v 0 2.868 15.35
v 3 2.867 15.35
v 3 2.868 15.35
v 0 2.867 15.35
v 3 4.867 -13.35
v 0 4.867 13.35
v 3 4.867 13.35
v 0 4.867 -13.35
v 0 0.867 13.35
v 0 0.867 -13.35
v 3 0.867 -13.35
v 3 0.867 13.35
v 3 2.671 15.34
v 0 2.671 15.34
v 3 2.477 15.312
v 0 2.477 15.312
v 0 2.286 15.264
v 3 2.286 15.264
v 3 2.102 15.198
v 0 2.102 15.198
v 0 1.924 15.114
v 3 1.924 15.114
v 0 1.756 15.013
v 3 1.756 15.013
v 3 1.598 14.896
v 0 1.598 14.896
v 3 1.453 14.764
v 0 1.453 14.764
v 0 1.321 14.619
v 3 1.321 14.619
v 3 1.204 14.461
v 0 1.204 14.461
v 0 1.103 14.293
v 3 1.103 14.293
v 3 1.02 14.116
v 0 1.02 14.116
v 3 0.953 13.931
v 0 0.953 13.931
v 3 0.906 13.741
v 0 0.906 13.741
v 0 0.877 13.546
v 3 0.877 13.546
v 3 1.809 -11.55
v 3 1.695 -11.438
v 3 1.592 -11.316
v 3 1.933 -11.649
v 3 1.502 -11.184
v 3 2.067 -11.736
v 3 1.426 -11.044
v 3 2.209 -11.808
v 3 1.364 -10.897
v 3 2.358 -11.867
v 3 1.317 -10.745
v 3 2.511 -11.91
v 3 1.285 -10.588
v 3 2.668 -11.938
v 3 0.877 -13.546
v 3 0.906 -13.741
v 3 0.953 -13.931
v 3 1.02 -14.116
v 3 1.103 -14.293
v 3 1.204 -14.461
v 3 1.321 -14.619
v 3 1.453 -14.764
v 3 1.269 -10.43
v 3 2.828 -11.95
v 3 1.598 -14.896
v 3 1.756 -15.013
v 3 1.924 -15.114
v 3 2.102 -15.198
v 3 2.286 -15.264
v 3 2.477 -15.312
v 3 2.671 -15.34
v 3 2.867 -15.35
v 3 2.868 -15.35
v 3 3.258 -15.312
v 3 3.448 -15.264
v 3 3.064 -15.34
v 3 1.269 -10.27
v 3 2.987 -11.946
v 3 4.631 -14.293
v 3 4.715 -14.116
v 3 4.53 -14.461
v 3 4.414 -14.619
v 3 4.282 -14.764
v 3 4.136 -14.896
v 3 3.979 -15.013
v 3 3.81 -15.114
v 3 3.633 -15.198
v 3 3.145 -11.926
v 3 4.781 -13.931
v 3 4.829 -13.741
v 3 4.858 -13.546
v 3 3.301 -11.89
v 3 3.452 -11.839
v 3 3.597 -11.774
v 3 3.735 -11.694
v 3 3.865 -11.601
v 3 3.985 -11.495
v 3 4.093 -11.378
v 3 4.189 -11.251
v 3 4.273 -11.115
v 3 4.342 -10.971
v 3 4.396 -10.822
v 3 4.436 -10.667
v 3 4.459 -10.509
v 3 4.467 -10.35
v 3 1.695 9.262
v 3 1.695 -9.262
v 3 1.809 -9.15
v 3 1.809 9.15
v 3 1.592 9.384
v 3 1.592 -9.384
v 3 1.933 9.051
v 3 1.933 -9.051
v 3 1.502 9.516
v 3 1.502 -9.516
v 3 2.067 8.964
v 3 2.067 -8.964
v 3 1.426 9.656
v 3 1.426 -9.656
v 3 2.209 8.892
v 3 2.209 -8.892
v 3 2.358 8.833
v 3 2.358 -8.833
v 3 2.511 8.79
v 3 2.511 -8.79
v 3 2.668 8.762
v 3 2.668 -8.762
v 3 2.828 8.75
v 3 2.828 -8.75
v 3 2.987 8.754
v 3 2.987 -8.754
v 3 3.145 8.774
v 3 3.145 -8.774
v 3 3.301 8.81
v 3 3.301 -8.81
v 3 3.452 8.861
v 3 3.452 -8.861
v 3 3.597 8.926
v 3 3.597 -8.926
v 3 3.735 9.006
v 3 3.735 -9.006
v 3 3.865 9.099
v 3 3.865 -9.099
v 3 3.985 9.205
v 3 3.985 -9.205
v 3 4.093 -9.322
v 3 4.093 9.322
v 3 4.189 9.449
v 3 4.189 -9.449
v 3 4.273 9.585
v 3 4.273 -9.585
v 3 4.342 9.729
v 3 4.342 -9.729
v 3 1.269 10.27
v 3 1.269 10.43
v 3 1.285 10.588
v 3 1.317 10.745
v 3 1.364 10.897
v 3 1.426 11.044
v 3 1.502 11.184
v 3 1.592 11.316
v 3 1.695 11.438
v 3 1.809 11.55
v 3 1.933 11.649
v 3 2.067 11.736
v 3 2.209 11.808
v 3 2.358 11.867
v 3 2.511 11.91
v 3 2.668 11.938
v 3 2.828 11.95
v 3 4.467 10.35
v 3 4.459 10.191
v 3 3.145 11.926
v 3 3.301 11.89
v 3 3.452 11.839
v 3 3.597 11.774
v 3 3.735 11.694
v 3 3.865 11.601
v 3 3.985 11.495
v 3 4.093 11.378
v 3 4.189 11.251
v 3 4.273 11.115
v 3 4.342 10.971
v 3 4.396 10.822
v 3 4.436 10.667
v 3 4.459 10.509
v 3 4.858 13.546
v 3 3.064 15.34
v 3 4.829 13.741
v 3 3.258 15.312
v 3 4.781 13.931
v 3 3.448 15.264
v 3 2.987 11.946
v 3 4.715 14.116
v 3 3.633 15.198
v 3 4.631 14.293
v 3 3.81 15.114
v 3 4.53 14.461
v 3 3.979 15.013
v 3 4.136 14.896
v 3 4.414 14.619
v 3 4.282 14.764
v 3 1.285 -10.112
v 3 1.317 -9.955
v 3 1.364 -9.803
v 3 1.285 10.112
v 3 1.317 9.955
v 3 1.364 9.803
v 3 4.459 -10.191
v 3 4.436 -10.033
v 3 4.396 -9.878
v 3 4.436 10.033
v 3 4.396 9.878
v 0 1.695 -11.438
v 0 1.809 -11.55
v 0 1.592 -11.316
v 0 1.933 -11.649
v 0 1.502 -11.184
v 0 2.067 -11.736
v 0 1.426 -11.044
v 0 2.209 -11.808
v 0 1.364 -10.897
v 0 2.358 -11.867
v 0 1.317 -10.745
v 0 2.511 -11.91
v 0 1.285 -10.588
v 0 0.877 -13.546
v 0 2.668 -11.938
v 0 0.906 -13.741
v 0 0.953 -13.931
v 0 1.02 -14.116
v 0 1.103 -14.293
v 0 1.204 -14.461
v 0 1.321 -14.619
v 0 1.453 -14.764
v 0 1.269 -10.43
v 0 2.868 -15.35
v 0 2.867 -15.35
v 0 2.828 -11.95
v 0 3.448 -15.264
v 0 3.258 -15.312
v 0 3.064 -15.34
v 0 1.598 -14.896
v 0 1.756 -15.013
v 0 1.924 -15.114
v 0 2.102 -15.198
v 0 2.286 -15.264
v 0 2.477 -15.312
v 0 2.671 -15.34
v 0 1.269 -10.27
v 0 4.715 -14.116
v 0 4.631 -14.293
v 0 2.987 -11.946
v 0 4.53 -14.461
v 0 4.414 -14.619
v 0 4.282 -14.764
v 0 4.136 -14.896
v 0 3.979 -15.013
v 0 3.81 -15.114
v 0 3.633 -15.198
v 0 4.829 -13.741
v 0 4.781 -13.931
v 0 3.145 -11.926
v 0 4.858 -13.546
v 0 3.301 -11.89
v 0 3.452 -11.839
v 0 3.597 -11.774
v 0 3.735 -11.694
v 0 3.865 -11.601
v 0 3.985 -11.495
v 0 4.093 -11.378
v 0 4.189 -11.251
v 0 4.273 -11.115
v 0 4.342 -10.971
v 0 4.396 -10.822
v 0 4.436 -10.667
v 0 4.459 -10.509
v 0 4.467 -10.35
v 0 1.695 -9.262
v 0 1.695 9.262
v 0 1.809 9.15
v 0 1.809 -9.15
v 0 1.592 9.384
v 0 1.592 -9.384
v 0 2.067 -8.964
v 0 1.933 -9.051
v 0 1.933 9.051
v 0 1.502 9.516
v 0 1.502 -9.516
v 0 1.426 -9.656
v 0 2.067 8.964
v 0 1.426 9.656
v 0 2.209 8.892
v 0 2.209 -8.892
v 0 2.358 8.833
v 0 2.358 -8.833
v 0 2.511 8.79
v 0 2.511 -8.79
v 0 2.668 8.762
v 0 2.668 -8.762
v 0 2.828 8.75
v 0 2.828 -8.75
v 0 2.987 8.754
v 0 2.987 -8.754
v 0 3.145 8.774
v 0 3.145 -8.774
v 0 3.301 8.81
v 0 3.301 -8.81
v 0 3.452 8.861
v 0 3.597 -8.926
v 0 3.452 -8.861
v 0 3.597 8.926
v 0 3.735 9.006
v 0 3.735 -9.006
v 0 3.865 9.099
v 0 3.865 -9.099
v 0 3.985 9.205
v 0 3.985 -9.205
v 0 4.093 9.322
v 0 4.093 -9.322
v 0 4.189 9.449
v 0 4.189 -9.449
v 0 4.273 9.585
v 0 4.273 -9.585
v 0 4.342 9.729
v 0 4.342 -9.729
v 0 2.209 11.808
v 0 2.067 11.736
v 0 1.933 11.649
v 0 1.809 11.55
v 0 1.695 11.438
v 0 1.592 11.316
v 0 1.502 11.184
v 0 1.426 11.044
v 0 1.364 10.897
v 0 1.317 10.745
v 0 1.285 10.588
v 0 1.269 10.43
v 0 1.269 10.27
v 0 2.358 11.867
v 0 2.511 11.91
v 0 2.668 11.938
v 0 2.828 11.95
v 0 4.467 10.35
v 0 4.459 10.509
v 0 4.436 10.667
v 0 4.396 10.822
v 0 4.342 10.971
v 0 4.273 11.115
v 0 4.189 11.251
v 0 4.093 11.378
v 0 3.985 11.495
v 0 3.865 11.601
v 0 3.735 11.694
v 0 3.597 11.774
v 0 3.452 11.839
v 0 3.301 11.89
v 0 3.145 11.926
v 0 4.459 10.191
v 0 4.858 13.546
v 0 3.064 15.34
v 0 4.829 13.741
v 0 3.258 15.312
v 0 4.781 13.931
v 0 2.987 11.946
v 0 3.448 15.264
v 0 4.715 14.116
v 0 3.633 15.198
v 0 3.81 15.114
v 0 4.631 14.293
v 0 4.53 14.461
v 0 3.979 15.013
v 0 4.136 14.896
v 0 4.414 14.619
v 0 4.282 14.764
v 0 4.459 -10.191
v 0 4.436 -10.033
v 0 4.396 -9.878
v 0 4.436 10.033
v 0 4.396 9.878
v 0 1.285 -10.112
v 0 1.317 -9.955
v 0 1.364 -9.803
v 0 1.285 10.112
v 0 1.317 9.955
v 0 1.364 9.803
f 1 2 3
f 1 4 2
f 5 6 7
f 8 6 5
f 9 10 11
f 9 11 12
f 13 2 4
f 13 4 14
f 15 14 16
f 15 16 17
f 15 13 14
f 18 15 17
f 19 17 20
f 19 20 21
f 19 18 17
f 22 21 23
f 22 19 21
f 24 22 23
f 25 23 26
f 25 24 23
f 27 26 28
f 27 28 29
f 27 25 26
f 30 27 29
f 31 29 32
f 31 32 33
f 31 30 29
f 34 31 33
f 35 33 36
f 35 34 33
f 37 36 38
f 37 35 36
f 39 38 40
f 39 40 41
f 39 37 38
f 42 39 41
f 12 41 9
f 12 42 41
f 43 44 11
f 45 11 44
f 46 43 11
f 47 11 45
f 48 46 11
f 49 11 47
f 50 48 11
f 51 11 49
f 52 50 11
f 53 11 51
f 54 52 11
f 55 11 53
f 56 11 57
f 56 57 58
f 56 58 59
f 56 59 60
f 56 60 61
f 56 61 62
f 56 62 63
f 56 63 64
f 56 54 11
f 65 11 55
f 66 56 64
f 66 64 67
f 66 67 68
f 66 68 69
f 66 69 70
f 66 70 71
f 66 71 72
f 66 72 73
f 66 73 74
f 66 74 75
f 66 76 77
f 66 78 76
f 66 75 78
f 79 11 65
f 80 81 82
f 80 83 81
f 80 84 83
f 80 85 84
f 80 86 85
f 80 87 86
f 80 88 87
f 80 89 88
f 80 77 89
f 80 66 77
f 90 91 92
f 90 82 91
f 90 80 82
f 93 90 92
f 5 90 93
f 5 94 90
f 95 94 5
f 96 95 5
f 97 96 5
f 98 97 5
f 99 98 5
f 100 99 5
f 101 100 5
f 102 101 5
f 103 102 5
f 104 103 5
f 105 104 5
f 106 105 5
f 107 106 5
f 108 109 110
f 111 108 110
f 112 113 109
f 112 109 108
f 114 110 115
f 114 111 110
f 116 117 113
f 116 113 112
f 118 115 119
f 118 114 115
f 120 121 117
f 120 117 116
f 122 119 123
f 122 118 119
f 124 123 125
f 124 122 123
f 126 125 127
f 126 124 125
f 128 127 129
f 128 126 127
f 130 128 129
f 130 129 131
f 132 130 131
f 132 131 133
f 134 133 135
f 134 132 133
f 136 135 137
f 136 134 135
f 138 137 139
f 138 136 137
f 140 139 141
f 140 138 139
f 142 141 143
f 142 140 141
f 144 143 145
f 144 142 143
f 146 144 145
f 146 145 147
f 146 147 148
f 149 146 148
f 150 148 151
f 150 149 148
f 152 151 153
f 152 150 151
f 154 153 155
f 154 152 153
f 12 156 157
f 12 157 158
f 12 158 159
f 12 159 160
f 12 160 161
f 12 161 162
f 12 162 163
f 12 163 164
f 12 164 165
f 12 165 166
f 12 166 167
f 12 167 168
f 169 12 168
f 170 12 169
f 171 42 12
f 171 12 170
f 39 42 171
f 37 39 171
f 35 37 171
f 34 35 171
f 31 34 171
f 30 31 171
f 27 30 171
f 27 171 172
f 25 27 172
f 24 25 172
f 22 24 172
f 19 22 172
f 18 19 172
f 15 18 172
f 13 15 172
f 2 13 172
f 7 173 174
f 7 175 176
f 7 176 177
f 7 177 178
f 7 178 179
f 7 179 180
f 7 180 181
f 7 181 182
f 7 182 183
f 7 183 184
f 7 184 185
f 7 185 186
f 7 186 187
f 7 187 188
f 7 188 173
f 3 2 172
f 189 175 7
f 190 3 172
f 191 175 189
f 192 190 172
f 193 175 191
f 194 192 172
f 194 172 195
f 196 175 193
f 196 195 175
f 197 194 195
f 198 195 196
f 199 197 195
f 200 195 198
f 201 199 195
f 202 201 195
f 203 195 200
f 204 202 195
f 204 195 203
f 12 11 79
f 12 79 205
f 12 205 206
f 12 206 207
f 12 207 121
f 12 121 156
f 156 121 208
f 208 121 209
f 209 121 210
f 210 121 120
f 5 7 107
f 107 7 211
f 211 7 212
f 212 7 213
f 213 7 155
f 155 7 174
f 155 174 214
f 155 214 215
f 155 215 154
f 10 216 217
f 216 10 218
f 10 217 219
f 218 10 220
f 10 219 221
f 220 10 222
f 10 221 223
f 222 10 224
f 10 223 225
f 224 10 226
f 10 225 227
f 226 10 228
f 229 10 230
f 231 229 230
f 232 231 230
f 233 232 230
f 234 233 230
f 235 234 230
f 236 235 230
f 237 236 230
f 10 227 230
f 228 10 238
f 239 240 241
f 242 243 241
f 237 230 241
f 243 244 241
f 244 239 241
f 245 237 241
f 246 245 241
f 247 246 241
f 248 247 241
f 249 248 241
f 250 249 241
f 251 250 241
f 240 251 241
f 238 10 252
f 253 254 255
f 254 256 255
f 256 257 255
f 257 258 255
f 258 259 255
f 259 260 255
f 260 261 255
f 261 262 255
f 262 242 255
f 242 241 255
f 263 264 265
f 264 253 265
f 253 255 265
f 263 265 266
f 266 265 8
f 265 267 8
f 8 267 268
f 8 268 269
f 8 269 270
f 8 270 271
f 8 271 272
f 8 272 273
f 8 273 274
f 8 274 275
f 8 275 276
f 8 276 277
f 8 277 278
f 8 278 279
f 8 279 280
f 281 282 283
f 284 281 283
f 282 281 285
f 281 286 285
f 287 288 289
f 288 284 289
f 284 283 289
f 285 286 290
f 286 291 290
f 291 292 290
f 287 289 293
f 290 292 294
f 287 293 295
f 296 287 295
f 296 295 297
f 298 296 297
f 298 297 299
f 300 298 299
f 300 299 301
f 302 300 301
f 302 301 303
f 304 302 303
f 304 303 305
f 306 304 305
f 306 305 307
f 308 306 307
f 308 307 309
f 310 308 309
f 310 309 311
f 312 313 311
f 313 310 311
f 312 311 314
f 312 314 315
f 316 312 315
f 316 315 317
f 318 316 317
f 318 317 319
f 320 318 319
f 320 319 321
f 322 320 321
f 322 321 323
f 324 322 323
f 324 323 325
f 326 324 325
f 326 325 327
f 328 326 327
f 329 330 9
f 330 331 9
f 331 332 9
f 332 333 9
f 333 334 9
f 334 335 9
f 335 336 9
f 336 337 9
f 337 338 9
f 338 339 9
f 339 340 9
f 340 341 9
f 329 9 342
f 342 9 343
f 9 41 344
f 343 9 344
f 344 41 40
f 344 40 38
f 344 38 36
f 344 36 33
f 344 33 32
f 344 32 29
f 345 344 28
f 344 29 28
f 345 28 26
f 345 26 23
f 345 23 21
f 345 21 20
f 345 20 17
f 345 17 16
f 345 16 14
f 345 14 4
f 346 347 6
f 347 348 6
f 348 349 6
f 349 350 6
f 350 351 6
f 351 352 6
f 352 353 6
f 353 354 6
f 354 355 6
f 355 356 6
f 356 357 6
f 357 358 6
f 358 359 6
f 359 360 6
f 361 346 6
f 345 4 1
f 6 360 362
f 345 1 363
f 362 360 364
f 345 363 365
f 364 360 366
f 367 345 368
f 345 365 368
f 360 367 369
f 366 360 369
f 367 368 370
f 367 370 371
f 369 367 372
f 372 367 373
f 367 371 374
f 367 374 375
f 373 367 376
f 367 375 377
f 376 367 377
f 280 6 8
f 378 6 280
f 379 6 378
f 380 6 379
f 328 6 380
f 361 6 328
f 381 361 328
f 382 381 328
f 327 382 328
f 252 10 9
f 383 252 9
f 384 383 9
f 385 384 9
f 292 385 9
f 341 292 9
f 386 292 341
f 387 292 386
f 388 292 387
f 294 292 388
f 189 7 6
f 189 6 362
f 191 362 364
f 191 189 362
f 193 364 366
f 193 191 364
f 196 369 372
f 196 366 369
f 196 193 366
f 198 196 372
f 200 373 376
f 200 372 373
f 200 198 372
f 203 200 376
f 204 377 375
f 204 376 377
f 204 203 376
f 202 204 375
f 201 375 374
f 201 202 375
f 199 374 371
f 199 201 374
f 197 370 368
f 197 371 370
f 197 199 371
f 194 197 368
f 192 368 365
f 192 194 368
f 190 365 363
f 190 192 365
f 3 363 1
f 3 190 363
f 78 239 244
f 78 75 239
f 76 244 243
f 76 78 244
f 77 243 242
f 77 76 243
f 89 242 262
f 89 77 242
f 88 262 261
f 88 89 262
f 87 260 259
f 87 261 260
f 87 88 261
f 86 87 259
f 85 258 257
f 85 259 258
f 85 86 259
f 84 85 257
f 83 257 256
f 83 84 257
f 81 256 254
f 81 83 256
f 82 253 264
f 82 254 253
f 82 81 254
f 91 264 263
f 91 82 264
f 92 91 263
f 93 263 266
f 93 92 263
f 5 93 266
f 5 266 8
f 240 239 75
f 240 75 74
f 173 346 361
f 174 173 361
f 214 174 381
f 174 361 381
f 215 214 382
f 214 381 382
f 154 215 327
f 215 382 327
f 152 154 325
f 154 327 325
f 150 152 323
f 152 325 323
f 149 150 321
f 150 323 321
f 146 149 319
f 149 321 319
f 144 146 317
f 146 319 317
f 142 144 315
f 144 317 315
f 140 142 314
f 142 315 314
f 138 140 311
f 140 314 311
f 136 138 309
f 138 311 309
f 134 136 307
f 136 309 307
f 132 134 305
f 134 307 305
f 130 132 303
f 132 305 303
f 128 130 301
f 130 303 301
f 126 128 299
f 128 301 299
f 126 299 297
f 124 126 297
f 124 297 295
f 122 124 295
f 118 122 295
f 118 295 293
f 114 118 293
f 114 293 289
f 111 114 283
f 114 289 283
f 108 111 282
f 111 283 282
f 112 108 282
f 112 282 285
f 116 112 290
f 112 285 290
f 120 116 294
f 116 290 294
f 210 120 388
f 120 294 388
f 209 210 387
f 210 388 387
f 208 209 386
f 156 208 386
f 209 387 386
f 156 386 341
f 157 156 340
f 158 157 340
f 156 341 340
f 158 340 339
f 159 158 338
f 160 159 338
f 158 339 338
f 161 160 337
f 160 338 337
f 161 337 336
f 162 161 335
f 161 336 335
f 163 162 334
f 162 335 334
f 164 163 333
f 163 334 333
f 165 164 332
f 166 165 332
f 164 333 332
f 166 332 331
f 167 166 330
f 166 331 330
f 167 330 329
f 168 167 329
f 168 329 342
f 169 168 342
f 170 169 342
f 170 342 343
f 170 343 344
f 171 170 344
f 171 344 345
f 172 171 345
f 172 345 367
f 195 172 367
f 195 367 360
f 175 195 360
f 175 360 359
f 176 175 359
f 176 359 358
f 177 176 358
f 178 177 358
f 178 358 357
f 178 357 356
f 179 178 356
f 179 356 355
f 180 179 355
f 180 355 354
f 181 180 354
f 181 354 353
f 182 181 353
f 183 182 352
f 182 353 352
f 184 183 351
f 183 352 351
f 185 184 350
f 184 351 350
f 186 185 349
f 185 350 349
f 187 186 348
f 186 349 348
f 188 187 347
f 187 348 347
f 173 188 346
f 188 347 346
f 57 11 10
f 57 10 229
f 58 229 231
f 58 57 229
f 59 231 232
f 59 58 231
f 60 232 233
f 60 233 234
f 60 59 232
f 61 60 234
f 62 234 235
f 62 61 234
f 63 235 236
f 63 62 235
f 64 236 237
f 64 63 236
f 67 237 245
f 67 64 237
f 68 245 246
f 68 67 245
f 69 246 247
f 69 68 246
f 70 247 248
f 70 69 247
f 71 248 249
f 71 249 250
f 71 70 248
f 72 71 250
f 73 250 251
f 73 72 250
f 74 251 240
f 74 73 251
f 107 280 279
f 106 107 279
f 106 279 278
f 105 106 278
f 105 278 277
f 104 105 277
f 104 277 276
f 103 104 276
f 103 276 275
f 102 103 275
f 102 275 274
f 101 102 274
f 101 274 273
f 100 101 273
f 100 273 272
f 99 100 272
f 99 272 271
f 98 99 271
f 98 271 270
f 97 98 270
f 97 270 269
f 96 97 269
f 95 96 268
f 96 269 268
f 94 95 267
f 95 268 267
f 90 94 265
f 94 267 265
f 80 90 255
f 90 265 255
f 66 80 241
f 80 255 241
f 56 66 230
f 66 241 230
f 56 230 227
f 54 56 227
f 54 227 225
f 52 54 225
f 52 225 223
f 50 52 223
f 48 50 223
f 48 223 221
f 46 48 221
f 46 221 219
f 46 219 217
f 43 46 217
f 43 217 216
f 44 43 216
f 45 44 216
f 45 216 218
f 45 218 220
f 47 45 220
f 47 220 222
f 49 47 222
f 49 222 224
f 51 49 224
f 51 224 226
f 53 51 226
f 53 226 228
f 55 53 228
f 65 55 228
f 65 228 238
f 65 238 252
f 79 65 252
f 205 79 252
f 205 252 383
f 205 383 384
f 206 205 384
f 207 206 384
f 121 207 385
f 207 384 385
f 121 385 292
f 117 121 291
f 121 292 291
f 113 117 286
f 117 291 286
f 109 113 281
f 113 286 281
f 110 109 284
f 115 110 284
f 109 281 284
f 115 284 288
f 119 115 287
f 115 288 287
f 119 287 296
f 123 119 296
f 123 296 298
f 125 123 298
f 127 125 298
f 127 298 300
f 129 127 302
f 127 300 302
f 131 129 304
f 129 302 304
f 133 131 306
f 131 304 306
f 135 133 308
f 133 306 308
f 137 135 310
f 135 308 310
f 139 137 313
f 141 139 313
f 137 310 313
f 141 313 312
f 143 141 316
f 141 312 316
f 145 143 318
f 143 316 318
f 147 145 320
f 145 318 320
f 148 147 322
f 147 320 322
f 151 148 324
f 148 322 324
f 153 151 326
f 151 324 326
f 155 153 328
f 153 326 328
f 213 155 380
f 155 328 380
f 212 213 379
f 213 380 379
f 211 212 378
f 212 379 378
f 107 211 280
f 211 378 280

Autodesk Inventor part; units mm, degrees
ref_plane "YZ Plane" through (0, 0, 0) normal (1, 0, 0) x (0, 1, 0)
ref_plane "XZ Plane" through (0, 0, 0) normal (0, 1, 0) x (-1, 0, 0)
ref_plane "XY Plane" through (0, 0, 0) normal (0, 0, 1) x (1, 0, 0)
sketch "スケッチ1" plane through (0, 0, 0) normal (1, 0, 0) x (0, 1, 0)
  line L0 (0.8674, 15.35) -> (4.8674, 15.35)
  line L1 (4.8674, 15.35) -> (4.8674, -15.35)
  line L2 (4.8674, -15.35) -> (0.8674, -15.35)
  line L3 (0.8674, -15.35) -> (0.8674, 15.35)
  circle A0 centre (2.8674, 10.35) radius 1.6
  line L4 (0.8674, 9.5) -> (5.8674, 9.5)
  line L5 (5.8674, 9.5) -> (5.8674, -9.5)
  line L6 (5.8674, -9.5) -> (0.8674, -9.5)
  line L7 (0.8674, -9.5) -> (0.8674, 9.5)
  circle A1 centre (2.8674, 10.35) radius 3.5
  line L8 (0.8674, 0) -> (5.8674, 0)
  circle A2 centre (2.8674, -10.35) radius 1.6
  line L9 (0.8674, 9.5) -> (0.3674, 9.5)
  line L10 (0.3674, 9.5) -> (0.3674, -7.3389)
  line L11 (0.3674, -7.3389) -> (0.8674, -7.3389)
  line L12 (0.8674, -7.3389) -> (0.8674, 9.5)
  point P0 (0, 0)
  dimension "d0" = 4
  dimension "d1" = 30.7
  dimension "d2" = 3.2
  dimension "d3" = 5
  dimension "d4" = 19
  dimension "d6" = 5
  dimension "d7" = 2
  dimension "d8" = 7
  dimension "d9" = 0.5
  dimension "d13" = 15.35
  dimension "d14" = 0
extrude "押し出し1" add sketch "スケッチ1" along normal blind 3 contours L0 L1 A1 L3 | A1 L1 L4 A0 L3 | L4 A0 L1 A1 L3 | A1 L1 L8 L3 | L8 L1 L6 A2 L3 | L6 A2 L1 L2 L3
fillet "フィレット1" radius 2 4 edges at (1.5, 4.8674, 15.35) (1.5, 0.8674, 15.35) (1.5, 0.8674, -15.35) (1.5, 4.8674, -15.35)
properties part number "belt_liner_v2_Plate_18" material "アルミニウム 6061"
